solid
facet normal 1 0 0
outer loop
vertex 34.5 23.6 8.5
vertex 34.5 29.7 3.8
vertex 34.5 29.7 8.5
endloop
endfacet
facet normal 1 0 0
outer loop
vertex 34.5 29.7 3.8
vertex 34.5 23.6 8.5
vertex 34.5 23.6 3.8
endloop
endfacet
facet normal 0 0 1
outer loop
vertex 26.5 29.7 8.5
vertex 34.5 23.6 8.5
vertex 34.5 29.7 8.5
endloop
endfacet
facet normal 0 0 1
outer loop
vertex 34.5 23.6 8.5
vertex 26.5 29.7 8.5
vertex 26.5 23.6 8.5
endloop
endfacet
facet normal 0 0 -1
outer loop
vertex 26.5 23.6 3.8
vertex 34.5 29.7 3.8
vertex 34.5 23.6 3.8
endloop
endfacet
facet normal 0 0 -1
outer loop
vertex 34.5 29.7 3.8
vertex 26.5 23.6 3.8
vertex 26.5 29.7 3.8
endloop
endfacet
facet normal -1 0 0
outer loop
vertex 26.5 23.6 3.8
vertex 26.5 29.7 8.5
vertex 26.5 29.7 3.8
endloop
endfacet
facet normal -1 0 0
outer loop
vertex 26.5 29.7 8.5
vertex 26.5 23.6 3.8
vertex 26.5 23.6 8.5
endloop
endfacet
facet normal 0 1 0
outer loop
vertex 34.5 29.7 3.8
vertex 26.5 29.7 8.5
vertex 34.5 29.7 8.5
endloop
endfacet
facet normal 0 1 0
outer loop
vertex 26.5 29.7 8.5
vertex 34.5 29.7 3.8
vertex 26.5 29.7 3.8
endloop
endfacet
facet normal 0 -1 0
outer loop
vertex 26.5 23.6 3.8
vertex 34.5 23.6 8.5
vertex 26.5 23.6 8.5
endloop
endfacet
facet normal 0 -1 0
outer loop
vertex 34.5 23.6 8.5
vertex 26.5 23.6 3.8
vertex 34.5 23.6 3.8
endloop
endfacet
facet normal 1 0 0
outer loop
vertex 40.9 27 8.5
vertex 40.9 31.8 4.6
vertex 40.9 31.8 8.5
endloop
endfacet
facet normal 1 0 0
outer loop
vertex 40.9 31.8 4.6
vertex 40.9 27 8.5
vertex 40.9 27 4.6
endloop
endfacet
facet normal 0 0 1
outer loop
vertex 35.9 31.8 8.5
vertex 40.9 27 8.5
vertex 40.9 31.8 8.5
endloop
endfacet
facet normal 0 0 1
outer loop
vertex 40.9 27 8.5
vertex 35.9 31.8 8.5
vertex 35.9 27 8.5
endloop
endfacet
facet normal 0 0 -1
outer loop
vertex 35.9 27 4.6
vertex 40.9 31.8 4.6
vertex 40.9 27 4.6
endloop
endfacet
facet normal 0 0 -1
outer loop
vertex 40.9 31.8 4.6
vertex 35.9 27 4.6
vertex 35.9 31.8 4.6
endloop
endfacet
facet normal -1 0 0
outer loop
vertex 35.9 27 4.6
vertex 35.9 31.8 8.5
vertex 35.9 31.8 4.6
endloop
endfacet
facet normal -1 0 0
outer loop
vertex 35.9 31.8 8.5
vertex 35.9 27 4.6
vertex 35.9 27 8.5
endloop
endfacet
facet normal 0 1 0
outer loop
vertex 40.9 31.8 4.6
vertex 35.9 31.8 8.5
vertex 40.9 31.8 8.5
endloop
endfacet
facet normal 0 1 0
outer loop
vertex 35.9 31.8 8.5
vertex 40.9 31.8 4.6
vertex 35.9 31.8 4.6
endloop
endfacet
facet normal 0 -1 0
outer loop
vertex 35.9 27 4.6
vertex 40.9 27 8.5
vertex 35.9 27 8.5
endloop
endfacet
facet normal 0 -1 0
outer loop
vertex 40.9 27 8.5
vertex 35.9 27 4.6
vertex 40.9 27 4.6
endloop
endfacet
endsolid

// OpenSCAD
union() {
  translate([26.5, 23.6, 3.8]) cube(size=[8.0,6.1,4.7], center=false);
  translate([35.9, 27.0, 4.6]) cube(size=[5.0,4.8,3.9], center=false);
}
